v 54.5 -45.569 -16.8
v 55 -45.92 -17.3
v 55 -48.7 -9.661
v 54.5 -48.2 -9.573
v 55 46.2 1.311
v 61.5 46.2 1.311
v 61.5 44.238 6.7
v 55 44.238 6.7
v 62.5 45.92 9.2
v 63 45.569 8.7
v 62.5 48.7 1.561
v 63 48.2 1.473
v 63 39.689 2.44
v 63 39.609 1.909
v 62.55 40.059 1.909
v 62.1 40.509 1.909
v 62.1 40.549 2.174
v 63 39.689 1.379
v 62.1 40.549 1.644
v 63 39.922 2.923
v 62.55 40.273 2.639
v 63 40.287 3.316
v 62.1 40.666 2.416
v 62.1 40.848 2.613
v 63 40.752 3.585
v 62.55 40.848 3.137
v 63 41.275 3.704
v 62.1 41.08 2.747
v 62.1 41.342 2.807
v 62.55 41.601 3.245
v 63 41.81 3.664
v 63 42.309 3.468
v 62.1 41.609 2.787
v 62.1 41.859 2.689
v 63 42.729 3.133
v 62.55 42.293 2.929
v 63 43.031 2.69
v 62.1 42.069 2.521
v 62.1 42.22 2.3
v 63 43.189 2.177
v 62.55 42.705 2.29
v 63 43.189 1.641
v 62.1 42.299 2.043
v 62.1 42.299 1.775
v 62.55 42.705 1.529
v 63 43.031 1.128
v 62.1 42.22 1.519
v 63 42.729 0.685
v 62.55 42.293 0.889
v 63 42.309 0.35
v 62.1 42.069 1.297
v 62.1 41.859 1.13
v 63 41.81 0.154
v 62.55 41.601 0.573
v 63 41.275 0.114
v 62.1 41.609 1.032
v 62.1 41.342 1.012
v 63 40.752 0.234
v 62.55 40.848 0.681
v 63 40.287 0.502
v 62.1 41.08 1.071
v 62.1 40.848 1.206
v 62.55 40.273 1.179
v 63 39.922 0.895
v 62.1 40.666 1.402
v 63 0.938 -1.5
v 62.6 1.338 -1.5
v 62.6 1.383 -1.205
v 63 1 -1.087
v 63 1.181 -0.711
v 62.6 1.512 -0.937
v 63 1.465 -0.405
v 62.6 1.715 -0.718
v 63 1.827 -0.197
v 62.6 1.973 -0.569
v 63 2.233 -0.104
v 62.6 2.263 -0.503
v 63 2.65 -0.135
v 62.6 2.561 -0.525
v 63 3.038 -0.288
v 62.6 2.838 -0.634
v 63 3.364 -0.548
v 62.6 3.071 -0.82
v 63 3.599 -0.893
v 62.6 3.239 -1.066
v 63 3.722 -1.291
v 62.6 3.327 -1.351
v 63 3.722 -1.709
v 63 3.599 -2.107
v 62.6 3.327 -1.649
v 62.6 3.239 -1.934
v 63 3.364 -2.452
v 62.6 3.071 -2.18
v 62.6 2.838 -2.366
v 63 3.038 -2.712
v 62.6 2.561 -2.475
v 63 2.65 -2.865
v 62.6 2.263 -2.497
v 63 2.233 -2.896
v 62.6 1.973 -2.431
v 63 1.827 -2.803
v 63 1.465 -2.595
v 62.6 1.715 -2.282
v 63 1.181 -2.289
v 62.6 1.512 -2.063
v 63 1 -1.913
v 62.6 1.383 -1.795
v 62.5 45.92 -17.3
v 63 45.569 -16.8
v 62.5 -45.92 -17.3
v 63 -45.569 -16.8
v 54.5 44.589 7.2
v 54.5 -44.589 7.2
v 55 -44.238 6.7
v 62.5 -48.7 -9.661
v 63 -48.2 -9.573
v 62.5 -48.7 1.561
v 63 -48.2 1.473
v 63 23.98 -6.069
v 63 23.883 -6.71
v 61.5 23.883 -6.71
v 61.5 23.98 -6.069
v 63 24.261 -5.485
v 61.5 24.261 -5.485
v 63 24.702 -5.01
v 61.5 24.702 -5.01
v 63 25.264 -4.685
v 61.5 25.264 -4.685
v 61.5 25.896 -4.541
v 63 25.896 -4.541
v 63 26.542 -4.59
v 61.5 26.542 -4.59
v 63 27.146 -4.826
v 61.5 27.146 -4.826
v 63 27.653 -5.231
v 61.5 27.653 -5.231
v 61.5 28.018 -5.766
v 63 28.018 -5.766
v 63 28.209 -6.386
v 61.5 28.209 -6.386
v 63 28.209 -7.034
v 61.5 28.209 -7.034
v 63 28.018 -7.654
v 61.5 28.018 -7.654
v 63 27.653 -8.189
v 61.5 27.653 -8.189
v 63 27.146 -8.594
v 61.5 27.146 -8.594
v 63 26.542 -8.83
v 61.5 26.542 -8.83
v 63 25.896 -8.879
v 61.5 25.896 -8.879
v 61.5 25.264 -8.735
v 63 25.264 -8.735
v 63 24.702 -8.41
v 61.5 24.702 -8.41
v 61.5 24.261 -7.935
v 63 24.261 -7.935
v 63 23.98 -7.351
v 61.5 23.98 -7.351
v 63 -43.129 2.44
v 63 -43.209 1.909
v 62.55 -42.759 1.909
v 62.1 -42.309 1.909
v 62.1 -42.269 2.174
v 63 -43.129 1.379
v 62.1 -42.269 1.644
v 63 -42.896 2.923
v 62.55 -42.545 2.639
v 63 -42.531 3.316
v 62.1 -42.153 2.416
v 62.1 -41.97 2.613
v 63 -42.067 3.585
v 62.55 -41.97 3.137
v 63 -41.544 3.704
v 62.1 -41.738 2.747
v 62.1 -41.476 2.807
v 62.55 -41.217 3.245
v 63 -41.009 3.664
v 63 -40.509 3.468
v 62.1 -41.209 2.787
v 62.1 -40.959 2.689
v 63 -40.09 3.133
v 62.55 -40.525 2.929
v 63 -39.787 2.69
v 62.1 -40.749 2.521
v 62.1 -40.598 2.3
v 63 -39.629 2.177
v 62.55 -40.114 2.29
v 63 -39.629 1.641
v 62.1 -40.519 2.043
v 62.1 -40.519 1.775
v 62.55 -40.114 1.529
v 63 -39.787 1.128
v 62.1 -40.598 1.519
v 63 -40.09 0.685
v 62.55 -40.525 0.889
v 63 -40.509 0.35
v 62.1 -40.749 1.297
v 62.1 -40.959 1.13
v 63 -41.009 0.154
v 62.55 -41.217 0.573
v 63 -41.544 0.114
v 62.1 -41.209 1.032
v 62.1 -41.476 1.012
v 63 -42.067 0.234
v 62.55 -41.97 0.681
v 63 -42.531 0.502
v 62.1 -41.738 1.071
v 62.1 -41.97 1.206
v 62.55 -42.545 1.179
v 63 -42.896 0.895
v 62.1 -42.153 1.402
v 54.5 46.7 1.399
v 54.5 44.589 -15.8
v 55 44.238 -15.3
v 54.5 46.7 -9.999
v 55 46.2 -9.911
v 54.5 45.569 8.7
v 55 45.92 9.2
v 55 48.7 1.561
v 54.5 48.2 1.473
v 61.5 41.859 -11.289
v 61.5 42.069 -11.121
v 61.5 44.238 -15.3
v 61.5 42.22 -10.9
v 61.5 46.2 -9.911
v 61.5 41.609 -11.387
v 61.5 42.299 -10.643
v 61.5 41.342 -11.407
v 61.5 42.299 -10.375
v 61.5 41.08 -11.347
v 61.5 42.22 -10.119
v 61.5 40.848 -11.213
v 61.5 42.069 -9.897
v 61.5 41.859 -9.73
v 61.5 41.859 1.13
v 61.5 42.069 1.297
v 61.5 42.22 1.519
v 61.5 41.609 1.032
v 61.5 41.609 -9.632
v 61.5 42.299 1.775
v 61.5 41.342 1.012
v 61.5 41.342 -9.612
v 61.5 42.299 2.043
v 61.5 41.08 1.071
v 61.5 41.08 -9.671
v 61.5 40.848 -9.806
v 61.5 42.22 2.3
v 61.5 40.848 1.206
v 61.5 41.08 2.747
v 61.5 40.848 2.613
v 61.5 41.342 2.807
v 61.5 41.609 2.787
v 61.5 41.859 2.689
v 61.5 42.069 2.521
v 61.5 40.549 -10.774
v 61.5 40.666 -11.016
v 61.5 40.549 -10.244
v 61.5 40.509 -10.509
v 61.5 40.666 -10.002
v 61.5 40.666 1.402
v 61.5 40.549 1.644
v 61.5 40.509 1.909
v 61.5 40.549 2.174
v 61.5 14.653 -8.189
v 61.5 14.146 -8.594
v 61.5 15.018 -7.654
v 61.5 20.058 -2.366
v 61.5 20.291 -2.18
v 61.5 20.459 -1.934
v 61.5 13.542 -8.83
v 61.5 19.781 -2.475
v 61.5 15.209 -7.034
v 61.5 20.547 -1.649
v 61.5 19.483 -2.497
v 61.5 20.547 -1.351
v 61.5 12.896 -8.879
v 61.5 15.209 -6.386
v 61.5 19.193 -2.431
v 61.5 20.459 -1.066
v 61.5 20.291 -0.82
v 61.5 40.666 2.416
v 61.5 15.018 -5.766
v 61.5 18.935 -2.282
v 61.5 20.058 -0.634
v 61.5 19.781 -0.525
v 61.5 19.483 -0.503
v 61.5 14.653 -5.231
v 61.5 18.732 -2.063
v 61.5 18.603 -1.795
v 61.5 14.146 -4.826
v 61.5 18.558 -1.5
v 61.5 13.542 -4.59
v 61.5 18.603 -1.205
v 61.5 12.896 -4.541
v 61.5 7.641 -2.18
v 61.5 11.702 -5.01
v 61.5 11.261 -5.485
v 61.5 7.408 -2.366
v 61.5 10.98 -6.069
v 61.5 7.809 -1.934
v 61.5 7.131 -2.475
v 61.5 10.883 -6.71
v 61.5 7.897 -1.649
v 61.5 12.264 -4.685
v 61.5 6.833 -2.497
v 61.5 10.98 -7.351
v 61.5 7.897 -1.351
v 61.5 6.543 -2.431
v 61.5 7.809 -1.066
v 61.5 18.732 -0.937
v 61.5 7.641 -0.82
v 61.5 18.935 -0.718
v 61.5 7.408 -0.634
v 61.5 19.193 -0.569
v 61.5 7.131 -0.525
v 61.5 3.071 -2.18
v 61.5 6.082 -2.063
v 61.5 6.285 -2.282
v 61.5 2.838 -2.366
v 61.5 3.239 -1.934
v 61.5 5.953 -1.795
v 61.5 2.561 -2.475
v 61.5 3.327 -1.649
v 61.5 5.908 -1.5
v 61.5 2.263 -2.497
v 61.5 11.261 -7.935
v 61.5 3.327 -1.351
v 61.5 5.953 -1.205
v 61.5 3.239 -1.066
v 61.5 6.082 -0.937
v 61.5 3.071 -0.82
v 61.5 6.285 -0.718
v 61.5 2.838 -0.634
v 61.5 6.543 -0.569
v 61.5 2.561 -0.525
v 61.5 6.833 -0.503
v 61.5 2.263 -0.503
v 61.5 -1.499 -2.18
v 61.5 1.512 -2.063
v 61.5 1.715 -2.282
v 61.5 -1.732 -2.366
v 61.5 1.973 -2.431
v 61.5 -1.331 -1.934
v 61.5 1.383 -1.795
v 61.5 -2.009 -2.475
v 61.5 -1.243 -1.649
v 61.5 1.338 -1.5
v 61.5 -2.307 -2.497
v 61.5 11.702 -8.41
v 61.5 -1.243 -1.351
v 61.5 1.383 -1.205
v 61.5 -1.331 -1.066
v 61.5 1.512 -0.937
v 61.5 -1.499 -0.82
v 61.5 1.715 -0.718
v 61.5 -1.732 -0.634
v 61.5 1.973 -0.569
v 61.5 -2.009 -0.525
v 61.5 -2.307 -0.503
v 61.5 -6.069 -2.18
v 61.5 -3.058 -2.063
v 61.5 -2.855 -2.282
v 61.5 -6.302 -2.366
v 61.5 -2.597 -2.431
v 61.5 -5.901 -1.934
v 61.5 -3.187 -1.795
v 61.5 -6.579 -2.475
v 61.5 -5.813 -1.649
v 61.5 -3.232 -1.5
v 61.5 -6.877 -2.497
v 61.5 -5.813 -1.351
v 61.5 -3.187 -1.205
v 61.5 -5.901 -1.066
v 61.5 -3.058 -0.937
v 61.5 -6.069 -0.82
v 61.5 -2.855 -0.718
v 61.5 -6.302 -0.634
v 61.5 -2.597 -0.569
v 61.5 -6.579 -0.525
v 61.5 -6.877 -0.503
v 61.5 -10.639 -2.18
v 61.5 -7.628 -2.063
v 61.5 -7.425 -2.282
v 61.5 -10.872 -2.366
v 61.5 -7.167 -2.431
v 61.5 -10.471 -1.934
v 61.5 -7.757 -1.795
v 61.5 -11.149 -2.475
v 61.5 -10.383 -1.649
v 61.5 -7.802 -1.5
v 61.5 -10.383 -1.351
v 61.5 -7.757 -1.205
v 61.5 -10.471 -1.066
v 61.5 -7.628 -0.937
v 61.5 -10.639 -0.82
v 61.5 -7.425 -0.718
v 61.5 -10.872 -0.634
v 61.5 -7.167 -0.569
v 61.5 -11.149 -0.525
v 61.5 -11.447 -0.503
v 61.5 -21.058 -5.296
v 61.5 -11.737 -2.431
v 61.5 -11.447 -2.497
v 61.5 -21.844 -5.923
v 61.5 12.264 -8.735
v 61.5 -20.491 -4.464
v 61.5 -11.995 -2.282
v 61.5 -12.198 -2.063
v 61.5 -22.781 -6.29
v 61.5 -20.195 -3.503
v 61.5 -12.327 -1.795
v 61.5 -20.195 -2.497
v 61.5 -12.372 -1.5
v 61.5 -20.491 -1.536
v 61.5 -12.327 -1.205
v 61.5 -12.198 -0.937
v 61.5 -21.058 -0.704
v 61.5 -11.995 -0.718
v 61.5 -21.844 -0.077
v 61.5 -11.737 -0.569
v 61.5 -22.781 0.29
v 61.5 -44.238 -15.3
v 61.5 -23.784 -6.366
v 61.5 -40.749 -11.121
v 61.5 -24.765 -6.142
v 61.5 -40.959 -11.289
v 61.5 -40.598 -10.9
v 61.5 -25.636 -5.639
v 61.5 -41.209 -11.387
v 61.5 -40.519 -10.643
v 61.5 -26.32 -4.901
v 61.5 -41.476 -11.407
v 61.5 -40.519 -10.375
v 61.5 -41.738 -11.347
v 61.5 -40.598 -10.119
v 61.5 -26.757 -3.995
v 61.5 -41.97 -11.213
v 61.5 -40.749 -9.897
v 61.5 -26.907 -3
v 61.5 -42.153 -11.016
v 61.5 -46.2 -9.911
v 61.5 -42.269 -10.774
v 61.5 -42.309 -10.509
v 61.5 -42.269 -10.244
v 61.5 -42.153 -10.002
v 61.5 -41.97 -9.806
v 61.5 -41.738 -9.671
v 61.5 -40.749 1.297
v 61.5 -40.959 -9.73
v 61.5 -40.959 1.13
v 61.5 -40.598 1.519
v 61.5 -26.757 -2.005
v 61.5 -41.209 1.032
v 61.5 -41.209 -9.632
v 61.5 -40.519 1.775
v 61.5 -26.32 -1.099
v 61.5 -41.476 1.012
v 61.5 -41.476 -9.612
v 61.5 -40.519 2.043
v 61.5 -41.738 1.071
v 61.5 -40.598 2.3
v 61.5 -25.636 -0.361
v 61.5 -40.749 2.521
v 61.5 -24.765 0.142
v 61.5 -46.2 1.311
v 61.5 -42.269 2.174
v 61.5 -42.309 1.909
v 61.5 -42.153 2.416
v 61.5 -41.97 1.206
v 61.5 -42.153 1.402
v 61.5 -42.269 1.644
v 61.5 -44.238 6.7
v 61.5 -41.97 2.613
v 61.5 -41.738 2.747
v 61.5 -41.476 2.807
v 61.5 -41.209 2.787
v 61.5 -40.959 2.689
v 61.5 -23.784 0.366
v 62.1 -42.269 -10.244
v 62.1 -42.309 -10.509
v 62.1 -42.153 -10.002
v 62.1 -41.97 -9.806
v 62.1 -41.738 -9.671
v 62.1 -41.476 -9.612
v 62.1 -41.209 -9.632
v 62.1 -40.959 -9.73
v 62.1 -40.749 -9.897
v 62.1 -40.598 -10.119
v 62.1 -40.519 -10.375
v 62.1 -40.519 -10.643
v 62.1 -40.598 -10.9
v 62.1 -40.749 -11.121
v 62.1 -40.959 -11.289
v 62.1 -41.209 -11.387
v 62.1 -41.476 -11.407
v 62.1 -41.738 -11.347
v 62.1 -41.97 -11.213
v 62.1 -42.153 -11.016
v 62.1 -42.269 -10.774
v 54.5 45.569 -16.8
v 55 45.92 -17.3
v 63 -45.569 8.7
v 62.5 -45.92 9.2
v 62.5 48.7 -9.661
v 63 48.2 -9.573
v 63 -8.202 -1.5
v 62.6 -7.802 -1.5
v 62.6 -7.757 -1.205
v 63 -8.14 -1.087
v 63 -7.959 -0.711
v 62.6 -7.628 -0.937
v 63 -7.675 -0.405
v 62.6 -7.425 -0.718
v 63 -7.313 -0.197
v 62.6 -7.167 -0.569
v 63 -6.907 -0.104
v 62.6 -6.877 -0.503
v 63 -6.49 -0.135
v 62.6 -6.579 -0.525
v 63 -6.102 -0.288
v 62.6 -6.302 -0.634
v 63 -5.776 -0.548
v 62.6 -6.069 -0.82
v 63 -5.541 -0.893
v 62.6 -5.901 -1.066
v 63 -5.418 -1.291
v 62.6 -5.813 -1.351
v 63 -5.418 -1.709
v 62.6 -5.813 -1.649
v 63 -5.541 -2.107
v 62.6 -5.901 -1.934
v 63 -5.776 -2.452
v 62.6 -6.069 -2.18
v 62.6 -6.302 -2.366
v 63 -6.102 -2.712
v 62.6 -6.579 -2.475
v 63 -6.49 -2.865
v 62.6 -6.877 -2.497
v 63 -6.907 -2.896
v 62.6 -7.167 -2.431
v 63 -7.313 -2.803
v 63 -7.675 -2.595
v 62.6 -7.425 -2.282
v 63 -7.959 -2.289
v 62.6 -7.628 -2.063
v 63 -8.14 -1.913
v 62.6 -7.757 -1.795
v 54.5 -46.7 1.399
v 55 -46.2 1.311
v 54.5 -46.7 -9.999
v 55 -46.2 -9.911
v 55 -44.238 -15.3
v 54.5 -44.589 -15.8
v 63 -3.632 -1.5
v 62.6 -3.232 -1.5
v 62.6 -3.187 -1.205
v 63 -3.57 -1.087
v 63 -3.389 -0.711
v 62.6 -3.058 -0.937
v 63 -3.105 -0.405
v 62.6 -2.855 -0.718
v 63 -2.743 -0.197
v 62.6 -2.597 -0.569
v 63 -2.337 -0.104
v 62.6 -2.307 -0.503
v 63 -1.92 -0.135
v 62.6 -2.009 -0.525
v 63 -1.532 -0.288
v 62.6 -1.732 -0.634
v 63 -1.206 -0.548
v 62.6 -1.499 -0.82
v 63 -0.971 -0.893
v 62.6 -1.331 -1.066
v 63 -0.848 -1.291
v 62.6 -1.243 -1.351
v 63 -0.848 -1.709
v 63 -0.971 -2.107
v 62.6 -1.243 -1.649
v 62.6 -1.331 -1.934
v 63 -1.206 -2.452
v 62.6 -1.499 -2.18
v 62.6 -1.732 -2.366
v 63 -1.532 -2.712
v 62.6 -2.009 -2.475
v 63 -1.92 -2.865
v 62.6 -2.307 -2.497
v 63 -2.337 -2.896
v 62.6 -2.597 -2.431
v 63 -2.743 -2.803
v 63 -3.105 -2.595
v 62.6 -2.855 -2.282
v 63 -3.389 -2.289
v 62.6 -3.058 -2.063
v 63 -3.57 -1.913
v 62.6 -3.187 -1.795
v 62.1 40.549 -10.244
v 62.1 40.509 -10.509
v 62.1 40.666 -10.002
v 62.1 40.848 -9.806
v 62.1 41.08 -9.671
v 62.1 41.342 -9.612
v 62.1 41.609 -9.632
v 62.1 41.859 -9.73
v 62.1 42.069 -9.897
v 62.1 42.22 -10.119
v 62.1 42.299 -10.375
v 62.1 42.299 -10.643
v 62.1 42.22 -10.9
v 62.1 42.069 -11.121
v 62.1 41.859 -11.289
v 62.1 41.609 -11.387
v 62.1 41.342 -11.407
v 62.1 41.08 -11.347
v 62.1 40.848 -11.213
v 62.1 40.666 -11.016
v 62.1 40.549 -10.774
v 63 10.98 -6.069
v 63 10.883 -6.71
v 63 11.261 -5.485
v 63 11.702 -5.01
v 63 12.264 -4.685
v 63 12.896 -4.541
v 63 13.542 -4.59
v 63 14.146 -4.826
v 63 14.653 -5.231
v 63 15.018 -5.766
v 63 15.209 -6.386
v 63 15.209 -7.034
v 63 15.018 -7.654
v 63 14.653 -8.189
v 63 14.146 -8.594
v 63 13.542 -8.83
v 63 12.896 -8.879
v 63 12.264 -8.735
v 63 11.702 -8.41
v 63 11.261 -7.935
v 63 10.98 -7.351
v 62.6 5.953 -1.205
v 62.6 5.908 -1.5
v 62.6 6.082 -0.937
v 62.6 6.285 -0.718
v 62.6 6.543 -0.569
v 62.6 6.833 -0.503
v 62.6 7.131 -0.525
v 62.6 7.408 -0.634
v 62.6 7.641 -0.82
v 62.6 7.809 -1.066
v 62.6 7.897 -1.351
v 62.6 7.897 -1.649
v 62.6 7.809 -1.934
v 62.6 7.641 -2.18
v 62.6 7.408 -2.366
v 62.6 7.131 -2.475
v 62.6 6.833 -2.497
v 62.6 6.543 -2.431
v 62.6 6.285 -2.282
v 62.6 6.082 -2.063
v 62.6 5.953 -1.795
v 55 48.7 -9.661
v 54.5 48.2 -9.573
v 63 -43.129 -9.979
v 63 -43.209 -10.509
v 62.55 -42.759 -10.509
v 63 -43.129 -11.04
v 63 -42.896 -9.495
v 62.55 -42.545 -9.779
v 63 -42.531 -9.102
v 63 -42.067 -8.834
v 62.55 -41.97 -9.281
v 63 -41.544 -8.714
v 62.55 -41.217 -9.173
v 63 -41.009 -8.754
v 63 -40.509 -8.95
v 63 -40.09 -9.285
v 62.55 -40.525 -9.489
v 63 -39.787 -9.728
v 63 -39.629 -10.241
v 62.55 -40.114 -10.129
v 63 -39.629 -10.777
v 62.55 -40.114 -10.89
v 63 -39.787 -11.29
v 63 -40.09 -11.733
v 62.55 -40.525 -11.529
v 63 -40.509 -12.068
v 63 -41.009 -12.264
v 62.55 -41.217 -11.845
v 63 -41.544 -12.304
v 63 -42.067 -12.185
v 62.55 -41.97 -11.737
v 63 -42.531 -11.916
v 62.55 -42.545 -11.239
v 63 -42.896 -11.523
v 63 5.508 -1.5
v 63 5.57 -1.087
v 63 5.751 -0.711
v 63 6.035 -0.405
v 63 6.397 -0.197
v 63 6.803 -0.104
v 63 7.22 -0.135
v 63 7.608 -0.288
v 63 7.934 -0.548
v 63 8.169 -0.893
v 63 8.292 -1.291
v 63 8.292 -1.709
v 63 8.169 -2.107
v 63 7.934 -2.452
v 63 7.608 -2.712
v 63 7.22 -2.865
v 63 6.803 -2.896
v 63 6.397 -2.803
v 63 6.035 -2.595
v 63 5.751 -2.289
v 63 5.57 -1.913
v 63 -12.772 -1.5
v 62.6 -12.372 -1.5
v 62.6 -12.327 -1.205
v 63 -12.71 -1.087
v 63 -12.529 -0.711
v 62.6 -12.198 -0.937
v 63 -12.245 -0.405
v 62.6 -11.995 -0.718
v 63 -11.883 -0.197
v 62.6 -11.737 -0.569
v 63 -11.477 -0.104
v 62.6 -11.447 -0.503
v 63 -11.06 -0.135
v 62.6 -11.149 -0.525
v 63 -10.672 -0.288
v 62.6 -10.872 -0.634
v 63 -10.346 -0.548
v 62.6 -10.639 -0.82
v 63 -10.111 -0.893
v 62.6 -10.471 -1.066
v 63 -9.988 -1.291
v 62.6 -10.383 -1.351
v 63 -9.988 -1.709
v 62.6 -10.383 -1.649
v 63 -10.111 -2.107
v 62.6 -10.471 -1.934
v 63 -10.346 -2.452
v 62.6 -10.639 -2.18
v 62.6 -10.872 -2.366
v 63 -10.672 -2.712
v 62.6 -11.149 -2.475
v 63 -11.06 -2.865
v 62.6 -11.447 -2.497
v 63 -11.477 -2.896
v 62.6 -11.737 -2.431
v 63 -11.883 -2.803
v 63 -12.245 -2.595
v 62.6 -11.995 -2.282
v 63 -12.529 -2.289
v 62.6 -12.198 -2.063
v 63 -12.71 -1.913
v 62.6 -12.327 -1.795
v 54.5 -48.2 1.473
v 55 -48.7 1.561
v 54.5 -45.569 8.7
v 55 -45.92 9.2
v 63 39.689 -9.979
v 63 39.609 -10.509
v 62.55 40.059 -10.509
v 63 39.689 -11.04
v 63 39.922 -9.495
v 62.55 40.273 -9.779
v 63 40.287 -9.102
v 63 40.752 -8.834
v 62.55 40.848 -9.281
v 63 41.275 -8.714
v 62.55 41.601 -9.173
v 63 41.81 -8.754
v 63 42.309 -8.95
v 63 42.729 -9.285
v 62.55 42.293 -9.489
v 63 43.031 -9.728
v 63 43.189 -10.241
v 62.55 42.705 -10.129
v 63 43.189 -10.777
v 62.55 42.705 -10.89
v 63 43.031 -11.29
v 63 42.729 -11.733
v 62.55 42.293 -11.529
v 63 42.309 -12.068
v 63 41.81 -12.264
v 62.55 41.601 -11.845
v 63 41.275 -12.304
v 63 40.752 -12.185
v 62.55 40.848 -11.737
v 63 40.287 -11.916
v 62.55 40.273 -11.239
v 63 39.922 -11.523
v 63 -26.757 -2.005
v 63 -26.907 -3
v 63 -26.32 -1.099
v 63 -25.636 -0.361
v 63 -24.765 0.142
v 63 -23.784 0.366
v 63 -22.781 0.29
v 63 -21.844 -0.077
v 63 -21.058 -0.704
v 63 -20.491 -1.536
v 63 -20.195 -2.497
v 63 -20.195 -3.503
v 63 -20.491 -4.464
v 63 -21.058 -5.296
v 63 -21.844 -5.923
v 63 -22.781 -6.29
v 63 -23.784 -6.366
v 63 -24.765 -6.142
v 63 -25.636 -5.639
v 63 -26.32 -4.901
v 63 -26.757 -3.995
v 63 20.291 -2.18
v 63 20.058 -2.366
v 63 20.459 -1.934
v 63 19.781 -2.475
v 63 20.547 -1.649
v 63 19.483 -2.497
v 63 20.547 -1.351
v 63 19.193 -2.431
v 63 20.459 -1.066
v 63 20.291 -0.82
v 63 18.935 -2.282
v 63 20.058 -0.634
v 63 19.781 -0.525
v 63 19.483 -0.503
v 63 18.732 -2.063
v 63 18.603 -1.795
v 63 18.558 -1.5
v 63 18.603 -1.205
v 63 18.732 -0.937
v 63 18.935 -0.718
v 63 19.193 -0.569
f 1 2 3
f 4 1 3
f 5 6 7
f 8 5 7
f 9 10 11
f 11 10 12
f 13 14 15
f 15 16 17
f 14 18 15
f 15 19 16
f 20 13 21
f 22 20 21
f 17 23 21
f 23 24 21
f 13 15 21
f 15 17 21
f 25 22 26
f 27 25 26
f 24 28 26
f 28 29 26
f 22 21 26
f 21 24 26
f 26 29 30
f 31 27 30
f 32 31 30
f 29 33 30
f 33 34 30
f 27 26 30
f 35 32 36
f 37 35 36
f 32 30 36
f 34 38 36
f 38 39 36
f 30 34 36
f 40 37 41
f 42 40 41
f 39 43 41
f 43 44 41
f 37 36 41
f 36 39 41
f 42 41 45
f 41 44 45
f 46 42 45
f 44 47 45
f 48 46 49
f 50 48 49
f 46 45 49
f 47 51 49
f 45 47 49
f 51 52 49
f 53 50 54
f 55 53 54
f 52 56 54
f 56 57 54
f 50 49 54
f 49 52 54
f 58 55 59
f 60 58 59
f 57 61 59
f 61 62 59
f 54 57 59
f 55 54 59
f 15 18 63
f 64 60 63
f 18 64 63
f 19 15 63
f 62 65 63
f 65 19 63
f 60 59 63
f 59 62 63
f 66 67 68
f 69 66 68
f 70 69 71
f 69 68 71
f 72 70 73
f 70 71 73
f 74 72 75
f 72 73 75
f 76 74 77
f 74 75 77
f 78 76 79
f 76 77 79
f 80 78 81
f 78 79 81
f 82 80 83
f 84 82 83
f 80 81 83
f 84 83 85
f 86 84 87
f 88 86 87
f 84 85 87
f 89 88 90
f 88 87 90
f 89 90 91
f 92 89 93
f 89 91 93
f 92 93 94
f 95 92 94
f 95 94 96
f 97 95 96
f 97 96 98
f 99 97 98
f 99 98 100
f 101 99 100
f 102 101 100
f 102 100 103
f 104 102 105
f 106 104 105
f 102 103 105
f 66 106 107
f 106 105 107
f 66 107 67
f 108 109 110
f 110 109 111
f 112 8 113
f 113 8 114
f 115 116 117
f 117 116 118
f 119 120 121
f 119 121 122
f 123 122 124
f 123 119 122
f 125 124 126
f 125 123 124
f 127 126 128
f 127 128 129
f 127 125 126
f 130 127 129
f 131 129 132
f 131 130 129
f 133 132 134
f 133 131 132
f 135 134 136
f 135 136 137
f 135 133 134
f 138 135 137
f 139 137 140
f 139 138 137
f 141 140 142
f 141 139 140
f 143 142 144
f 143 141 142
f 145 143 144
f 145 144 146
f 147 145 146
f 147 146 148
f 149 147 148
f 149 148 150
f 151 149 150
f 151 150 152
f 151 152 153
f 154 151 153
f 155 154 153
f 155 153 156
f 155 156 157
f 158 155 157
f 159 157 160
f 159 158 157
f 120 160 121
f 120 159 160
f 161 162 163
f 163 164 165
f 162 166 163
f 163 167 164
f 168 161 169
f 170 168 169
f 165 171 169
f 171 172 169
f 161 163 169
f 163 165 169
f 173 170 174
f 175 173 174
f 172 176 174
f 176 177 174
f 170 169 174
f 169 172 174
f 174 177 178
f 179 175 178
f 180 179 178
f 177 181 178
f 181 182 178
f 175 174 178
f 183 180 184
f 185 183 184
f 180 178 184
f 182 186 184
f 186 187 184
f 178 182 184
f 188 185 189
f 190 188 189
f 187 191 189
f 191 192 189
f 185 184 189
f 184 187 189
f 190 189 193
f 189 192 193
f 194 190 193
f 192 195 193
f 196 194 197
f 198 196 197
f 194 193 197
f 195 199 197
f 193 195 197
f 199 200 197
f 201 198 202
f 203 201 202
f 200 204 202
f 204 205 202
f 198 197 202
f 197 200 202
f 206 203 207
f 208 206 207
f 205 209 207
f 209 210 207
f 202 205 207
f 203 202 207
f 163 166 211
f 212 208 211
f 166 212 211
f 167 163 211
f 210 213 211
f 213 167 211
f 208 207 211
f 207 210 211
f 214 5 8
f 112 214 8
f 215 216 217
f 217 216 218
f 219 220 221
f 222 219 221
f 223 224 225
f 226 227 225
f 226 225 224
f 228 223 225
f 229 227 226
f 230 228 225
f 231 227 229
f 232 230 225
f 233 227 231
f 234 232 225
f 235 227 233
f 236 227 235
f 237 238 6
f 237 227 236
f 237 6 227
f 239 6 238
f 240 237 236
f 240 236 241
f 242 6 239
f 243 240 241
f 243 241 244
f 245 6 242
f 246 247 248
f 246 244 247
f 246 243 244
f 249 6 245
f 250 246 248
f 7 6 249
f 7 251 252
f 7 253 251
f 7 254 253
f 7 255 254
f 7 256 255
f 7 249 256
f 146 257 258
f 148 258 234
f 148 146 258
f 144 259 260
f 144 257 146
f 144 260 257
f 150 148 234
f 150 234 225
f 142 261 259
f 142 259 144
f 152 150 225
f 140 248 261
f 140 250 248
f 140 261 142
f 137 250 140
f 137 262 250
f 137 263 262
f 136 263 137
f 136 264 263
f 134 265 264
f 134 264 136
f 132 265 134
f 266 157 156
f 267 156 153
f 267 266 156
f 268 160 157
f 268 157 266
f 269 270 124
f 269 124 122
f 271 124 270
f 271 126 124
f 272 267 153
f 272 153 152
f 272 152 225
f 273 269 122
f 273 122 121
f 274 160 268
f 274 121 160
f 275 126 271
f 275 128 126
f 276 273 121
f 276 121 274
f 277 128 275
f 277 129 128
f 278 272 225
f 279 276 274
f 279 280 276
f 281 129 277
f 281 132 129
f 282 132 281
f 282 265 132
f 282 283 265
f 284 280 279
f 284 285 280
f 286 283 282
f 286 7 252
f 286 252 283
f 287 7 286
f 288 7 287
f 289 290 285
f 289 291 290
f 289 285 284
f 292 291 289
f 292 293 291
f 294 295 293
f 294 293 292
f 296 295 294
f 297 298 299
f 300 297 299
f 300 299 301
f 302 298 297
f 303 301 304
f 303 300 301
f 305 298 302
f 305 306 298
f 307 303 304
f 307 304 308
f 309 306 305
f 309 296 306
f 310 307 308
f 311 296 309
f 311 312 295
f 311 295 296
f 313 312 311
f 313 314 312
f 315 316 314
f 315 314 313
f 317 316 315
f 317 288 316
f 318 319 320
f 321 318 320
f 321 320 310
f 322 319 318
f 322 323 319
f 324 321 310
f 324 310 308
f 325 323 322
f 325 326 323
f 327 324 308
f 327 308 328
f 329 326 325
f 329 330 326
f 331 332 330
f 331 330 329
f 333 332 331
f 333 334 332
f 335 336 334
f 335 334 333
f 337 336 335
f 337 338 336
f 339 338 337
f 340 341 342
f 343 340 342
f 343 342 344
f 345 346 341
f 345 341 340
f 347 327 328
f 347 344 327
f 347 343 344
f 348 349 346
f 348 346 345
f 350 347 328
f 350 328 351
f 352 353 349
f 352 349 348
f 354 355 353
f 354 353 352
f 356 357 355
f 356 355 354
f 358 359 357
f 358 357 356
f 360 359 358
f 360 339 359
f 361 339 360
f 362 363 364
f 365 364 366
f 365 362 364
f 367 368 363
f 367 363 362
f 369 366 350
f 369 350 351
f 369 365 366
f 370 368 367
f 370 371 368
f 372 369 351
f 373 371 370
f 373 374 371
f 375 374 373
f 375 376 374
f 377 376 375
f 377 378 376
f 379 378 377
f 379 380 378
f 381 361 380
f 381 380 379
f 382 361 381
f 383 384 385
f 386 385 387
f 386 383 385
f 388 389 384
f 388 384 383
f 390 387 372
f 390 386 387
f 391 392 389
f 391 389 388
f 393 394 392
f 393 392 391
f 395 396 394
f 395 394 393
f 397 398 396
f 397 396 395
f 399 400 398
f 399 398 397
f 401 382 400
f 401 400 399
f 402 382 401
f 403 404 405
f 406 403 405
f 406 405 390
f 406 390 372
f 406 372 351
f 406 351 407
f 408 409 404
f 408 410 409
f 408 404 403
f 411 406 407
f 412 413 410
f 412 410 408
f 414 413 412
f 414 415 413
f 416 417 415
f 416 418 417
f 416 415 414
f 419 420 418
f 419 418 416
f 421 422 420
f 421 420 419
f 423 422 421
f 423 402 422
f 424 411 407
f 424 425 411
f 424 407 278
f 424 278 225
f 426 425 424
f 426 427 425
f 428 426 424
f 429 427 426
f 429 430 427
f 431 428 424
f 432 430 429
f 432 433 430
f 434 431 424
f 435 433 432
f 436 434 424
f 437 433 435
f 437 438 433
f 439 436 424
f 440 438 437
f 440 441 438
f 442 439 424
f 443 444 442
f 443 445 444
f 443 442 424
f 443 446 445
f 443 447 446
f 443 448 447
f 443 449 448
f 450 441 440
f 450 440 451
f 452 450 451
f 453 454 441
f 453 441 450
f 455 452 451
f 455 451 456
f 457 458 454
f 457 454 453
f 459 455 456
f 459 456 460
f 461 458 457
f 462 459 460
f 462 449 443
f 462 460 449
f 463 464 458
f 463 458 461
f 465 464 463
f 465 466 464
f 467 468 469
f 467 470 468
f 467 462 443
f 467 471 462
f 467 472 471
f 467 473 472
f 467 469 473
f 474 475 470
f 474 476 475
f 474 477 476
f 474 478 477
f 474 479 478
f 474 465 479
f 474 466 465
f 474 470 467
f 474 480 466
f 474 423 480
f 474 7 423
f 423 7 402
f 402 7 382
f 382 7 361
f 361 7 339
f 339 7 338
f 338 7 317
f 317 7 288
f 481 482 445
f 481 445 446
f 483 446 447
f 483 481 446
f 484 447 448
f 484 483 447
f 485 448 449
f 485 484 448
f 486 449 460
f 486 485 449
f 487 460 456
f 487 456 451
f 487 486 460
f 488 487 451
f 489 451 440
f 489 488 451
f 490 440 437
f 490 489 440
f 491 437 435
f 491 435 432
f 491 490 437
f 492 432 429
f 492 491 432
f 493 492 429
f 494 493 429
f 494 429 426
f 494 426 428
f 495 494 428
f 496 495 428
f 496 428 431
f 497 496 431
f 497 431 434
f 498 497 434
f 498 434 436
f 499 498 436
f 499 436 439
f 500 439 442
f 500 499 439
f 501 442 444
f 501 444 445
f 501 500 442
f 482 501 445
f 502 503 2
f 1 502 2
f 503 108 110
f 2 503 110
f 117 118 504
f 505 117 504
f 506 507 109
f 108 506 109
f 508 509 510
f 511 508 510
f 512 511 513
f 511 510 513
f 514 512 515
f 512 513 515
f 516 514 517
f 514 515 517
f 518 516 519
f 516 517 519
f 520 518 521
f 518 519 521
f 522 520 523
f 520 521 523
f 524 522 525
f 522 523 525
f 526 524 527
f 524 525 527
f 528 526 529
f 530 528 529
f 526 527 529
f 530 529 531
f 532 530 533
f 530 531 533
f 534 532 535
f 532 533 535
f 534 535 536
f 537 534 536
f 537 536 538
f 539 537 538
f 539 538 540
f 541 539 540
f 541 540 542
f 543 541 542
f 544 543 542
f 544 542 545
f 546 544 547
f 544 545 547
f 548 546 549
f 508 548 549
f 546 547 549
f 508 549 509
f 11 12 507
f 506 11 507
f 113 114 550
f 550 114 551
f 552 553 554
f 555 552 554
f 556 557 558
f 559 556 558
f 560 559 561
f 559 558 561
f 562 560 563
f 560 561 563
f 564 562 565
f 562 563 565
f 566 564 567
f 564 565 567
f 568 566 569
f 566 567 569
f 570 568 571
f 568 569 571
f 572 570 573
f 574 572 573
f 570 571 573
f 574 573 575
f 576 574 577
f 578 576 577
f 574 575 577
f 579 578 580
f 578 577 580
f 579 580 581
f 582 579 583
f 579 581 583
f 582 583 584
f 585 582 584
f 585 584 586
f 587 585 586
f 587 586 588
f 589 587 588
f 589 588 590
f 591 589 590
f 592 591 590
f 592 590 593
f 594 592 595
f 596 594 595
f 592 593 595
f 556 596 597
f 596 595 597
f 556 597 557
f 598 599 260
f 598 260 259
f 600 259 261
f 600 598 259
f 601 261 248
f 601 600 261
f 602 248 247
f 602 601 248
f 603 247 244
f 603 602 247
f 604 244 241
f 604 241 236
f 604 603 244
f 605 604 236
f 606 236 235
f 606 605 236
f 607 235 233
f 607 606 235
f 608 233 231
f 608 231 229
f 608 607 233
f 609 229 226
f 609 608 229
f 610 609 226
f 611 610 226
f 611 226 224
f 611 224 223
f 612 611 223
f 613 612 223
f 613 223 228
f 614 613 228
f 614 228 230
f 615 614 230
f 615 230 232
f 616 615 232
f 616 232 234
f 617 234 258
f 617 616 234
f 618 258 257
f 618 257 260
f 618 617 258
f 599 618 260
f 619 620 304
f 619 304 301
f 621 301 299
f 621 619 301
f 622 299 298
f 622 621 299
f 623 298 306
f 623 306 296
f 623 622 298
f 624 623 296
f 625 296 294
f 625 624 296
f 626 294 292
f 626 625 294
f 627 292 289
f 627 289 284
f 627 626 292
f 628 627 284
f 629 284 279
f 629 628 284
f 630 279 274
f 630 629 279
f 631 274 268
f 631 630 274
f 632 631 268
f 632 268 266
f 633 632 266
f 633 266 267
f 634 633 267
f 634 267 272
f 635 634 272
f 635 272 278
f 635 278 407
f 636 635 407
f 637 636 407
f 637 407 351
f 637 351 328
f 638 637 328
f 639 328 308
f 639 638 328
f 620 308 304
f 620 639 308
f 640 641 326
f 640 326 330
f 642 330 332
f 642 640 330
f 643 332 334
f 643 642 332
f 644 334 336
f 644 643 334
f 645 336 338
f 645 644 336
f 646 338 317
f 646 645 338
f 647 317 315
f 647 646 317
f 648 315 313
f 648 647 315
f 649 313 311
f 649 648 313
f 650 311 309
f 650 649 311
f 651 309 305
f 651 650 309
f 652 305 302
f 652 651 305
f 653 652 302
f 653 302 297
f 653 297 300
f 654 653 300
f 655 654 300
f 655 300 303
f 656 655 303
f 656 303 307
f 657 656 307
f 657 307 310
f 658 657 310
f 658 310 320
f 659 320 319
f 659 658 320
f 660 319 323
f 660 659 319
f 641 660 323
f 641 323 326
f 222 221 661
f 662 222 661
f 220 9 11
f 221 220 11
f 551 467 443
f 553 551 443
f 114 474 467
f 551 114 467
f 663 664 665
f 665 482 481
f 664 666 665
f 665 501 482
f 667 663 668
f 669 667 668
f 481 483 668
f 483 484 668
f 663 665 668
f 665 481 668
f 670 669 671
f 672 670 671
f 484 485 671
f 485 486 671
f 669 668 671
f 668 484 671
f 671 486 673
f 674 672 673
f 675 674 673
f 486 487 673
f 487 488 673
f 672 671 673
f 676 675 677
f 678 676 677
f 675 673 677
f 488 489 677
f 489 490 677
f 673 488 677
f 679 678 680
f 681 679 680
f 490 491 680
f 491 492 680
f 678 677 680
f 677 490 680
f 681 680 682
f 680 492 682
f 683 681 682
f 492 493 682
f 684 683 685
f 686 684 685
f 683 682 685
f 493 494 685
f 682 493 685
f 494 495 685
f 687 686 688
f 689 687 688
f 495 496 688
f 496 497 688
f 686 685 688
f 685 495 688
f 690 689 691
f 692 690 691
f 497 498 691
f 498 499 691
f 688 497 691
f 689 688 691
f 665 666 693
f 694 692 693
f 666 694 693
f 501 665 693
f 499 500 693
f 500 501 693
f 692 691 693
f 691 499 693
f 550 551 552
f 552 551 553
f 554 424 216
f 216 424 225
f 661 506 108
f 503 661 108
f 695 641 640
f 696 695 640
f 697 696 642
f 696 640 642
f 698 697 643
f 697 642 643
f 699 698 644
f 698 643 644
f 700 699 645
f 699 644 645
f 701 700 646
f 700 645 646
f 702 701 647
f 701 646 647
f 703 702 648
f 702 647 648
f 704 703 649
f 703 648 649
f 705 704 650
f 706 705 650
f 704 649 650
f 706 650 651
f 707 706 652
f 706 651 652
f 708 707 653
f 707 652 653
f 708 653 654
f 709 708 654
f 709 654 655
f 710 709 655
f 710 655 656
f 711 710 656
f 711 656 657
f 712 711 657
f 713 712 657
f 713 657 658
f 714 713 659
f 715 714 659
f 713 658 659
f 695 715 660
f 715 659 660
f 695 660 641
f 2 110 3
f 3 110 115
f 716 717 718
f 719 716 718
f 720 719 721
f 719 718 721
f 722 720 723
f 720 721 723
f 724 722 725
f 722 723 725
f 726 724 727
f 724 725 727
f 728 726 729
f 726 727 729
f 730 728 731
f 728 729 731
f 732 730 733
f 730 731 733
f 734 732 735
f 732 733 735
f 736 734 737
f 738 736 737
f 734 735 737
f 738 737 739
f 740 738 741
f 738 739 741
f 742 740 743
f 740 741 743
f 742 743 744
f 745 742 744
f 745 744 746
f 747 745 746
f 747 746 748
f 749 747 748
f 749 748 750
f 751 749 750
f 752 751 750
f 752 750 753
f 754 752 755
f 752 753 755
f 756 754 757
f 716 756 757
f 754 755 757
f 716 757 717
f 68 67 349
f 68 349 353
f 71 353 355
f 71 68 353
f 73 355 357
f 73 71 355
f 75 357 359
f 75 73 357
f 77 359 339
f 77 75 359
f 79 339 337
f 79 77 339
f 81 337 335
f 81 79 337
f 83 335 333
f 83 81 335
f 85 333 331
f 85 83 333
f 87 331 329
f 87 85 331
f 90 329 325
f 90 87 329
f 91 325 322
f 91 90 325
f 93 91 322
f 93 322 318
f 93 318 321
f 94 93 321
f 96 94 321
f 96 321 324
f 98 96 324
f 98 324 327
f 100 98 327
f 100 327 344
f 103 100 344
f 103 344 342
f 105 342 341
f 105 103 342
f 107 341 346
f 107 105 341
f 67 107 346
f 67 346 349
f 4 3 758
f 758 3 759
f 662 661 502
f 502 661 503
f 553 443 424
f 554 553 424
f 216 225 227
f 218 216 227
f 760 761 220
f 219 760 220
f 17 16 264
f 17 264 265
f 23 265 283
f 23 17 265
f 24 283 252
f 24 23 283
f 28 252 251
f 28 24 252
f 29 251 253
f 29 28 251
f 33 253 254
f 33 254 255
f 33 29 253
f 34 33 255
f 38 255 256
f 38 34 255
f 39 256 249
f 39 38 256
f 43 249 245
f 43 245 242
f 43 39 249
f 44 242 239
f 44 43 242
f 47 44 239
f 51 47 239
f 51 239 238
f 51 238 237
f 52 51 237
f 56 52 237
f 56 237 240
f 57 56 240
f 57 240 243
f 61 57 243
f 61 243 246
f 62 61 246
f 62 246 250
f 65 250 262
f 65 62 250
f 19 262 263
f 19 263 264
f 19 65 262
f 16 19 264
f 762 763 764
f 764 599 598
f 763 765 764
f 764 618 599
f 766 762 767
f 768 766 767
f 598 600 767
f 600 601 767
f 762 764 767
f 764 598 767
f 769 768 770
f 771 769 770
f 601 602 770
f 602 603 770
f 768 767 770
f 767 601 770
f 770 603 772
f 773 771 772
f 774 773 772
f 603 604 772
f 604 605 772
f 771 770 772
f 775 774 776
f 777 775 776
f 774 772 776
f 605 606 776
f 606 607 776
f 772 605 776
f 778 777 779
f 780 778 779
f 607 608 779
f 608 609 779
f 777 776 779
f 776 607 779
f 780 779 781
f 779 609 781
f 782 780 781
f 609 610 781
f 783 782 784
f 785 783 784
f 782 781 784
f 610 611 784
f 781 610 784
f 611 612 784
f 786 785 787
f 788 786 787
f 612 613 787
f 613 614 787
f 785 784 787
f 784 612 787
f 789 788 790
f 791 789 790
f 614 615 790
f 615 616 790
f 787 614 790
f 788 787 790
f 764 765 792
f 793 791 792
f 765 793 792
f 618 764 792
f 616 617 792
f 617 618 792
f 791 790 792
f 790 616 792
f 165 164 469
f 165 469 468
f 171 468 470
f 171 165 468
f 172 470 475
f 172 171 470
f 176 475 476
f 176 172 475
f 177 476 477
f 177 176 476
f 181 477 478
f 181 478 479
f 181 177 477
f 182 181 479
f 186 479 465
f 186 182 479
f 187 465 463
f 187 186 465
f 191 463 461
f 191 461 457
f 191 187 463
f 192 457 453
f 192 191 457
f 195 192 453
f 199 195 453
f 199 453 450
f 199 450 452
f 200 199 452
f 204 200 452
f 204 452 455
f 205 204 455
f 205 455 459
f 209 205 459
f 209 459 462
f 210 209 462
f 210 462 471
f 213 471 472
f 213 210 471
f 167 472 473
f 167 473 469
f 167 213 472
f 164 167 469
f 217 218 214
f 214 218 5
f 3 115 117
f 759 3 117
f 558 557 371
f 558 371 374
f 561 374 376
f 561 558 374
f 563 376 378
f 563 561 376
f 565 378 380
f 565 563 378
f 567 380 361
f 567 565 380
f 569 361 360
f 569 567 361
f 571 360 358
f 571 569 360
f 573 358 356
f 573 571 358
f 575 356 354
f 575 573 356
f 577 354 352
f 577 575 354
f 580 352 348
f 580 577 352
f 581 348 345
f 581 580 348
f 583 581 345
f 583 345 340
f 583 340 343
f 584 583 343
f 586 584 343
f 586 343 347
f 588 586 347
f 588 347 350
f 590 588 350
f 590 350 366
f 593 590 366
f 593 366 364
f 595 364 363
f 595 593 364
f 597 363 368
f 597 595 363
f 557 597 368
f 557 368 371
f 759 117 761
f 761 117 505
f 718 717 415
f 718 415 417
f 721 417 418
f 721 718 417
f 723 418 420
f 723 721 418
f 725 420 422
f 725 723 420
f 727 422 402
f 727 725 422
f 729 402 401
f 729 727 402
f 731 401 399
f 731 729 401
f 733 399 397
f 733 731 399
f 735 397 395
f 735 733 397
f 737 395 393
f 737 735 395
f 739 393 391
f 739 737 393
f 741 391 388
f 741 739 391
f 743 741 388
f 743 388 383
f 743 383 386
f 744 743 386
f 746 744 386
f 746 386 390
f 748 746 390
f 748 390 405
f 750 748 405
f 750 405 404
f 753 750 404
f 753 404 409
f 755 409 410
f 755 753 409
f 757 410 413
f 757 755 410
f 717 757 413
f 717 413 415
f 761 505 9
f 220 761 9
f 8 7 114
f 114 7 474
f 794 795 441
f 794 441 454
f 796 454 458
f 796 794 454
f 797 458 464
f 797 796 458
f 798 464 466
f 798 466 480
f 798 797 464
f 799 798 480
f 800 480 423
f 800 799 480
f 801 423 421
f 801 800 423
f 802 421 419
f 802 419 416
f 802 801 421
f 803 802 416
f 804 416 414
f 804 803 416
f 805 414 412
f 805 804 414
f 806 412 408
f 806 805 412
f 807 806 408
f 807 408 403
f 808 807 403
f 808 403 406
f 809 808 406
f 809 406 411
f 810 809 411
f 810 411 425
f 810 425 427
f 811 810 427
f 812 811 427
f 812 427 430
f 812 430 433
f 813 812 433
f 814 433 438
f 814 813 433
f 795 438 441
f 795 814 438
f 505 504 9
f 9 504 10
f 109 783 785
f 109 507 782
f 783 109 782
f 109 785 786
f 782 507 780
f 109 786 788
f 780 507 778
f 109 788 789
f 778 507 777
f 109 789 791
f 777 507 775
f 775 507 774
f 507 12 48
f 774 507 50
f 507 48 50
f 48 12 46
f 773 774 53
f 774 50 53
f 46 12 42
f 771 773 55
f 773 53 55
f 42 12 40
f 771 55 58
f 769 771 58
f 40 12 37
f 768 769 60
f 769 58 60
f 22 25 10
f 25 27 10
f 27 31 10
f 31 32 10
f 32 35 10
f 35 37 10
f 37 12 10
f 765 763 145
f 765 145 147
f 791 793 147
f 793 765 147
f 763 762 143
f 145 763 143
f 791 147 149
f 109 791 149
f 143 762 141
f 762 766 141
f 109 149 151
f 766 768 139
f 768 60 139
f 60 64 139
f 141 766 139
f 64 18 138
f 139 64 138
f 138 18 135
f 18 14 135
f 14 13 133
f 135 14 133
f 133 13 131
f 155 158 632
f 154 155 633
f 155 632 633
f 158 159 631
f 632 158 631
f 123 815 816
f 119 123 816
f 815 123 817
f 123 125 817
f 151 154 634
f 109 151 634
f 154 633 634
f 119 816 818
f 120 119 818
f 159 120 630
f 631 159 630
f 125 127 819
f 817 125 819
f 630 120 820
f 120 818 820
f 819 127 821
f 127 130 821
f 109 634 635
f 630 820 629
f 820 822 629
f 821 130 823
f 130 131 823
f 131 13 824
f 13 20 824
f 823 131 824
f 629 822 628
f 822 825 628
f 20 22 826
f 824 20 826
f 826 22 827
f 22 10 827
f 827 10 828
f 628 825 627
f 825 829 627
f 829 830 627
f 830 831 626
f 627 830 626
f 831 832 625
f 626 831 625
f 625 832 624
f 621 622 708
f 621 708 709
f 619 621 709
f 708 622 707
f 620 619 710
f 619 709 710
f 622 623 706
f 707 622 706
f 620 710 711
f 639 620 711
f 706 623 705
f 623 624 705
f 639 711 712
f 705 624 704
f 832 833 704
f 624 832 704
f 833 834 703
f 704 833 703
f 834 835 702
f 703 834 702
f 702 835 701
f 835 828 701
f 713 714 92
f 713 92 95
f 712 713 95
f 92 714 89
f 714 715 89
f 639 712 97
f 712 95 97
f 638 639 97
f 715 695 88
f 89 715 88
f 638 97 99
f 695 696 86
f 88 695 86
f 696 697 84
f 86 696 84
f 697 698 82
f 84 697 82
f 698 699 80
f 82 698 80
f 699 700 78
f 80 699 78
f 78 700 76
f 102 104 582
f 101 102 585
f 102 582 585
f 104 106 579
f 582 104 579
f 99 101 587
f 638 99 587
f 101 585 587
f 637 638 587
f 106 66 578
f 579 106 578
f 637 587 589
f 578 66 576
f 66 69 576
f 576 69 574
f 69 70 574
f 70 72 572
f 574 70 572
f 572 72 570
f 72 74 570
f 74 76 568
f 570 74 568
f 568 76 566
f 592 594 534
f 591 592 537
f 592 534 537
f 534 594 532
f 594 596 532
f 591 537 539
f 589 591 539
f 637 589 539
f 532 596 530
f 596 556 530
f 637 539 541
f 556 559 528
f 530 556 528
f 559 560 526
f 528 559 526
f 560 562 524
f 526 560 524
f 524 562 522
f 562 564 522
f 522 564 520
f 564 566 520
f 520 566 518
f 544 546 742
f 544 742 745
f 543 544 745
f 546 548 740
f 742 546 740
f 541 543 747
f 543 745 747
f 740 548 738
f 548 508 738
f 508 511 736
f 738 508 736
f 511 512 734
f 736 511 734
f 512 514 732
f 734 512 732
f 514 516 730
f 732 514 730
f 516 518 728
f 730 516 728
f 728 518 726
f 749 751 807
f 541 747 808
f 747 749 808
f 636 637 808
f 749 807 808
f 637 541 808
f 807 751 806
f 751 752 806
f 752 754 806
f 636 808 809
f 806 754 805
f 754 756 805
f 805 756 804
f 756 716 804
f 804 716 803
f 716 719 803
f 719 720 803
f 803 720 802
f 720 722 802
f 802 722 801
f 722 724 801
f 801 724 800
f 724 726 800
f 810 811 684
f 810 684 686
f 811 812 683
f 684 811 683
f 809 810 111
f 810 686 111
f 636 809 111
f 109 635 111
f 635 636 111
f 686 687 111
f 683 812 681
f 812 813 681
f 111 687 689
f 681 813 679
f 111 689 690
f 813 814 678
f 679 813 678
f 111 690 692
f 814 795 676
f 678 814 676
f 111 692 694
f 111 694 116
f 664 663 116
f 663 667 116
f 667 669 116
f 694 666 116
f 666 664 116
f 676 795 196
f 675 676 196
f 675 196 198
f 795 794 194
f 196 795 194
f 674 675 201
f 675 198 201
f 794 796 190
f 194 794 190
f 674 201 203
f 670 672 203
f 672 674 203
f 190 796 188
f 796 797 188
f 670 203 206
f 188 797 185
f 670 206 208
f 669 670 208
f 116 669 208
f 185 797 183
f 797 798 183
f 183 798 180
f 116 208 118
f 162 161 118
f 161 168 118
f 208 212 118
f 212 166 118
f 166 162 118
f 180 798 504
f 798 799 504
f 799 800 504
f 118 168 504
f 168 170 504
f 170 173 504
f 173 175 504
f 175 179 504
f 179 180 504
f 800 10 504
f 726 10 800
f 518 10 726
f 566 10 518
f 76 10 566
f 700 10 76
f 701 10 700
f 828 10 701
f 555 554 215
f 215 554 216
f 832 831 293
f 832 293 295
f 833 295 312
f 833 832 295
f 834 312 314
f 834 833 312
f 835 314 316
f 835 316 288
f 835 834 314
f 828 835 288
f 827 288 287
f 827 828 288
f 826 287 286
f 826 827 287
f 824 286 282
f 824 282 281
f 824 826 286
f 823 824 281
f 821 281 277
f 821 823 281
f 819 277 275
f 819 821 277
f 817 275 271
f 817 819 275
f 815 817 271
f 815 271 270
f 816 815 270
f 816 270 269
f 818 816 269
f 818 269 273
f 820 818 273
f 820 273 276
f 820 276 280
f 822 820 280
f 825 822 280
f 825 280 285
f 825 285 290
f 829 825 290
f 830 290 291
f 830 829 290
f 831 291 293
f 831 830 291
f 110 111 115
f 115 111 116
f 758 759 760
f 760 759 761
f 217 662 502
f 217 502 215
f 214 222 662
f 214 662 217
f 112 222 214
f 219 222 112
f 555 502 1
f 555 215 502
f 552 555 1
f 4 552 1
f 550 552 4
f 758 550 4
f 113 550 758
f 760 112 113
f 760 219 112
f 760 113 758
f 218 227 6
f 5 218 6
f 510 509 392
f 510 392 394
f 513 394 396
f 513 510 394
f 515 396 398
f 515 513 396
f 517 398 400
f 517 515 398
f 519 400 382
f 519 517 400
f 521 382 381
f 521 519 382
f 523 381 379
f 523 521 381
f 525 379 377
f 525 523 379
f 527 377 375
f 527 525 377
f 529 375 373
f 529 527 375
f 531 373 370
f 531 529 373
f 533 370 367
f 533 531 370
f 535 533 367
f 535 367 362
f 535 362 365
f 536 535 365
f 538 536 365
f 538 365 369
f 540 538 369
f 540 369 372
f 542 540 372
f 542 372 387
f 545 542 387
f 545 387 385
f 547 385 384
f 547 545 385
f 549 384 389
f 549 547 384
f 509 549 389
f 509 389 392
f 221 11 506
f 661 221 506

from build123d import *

# Parameters (mm, degrees)
SKETCH014_R             = 2.175
SKETCH014_R_2           = 1
SKETCH014_R_3           = 3.375
SKETCH014_R_4           = 0.9
PAD012_DEPTH            = 1.5
PAD013_DEPTH            = 1.5
PAD013_DEPTH_BACK       = 7
CHAMFER_SIZE            = 0.9
CHAMFER001_SIZE         = 0.5
CHAMFER002_SIZE         = 0.5
CHAMFER003_SIZE         = 0.4
BODY003_PLACEMENT_ANGLE = 180


with BuildPart() as part:
    # Sketch014 → Pad012 (new body)
    with BuildSketch(Plane.YZ.offset(60)):
        Polygon((-44.238463, 6.7), (44.238463, 6.7), (46.2, 1.310722), (46.2, -9.910722), (44.238463, -15.3), (-44.238463, -15.3), (-46.2, -9.910722), (-46.2, 1.310722), align=None)
        with Locations((-26.058118, -6.71)):
            Circle(SKETCH014_R, mode=Mode.SUBTRACT)
        with Locations((-19.558118, -1.5)):
            Circle(SKETCH014_R_2, mode=Mode.SUBTRACT)
        with Locations((-13.058118, -6.71)):
            Circle(SKETCH014_R, mode=Mode.SUBTRACT)
        with Locations((-6.908118, -1.5)):
            Circle(SKETCH014_R_2, mode=Mode.SUBTRACT)
        with Locations((-2.338118, -1.5)):
            Circle(SKETCH014_R_2, mode=Mode.SUBTRACT)
        with Locations((2.231882, -1.5)):
            Circle(SKETCH014_R_2, mode=Mode.SUBTRACT)
        with Locations((6.801882, -1.5)):
            Circle(SKETCH014_R_2, mode=Mode.SUBTRACT)
        with Locations((11.371882, -1.5)):
            Circle(SKETCH014_R_2, mode=Mode.SUBTRACT)
        with Locations((23.531882, -3)):
            Circle(SKETCH014_R_3, mode=Mode.SUBTRACT)
        with Locations((-41.409188, 1.909188)):
            Circle(SKETCH014_R_4, mode=Mode.SUBTRACT)
        with Locations((41.409188, 1.909188)):
            Circle(SKETCH014_R_4, mode=Mode.SUBTRACT)
        with Locations((41.409188, -10.509188)):
            Circle(SKETCH014_R_4, mode=Mode.SUBTRACT)
        with Locations((-41.409188, -10.509188)):
            Circle(SKETCH014_R_4, mode=Mode.SUBTRACT)
    extrude(amount=PAD012_DEPTH)

    # Sketch015 (on Face23 of Pad012) → Pad013 (join, two sides)
    with BuildSketch(Plane.YZ.offset(61.5)) as pad013_sk:
        Polygon((-45.91953, 9.2), (-48.7, 1.560722), (-48.7, -9.660722), (-45.91953, -17.3), (45.91953, -17.3), (48.7, -9.660722), (48.7, 1.560722), (45.91953, 9.2), align=None)
        Polygon((-44.238463, 6.7), (44.238463, 6.7), (46.2, 1.310722), (46.2, -9.910722), (44.238463, -15.3), (-44.238463, -15.3), (-46.2, -9.910722), (-46.2, 1.310722), align=None, mode=Mode.SUBTRACT)
    extrude(amount=-PAD013_DEPTH)
    extrude(pad013_sk.sketch, amount=PAD013_DEPTH_BACK)

    # Chamfer
    chamfer_edges = [part.edges().sort_by_distance(p)[0] for p in [
        (60, -42.309188, -10.509188),
        (60, -42.309188, 1.909188),
        (60, 40.509188, 1.909188),
        (60, 40.509188, -10.509188),
    ]]
    chamfer(chamfer_edges, length=CHAMFER_SIZE)

    # Chamfer001
    chamfer001_edges = [part.edges().sort_by_distance(p)[0] for p in [
        (68.5, 0, 6.7),
        (68.5, -45.219232, 4.005361),
        (68.5, -46.2, -4.3),
        (68.5, -45.219232, -12.605361),
        (68.5, 0, -15.3),
        (68.5, 45.219232, -12.605361),
        (68.5, 46.2, -4.3),
        (68.5, 45.219232, 4.005361),
    ]]
    chamfer(chamfer001_edges, length=CHAMFER001_SIZE)

    # Chamfer002
    chamfer002_edges = [part.edges().sort_by_distance(p)[0] for p in [
        (68.5, 0, 9.2),
        (68.5, -47.309765, 5.380361),
        (68.5, -48.7, -4.05),
        (68.5, -47.309765, -13.480361),
        (68.5, 0, -17.3),
        (68.5, 47.309765, -13.480361),
        (68.5, 48.7, -4.05),
        (68.5, 47.309765, 5.380361),
        (60, 47.309765, 5.380361),
        (60, 48.7, -4.05),
        (60, 47.309765, -13.480361),
        (60, 0, -17.3),
        (60, 0, 9.2),
        (60, -47.309765, 5.380361),
        (60, -48.7, -4.05),
        (60, -47.309765, -13.480361),
    ]]
    chamfer(chamfer002_edges, length=CHAMFER002_SIZE)

    # Chamfer003
    chamfer003_edges = [part.edges().sort_by_distance(p)[0] for p in [
        (60, -7.908118, -1.5),
        (60, -3.338118, -1.5),
        (60, 1.231882, -1.5),
        (60, 5.801882, -1.5),
        (60, 10.371882, -1.5),
    ]]
    chamfer(chamfer003_edges, length=CHAMFER003_SIZE)


with BuildPart() as part_1:
    # Body003 placement: moved
    add(part.part.moved(Location((123, 0, 0))).rotate(Axis((123, 0, 0), (0, 0, 1)), BODY003_PLACEMENT_ANGLE))


solid = part_1.part
